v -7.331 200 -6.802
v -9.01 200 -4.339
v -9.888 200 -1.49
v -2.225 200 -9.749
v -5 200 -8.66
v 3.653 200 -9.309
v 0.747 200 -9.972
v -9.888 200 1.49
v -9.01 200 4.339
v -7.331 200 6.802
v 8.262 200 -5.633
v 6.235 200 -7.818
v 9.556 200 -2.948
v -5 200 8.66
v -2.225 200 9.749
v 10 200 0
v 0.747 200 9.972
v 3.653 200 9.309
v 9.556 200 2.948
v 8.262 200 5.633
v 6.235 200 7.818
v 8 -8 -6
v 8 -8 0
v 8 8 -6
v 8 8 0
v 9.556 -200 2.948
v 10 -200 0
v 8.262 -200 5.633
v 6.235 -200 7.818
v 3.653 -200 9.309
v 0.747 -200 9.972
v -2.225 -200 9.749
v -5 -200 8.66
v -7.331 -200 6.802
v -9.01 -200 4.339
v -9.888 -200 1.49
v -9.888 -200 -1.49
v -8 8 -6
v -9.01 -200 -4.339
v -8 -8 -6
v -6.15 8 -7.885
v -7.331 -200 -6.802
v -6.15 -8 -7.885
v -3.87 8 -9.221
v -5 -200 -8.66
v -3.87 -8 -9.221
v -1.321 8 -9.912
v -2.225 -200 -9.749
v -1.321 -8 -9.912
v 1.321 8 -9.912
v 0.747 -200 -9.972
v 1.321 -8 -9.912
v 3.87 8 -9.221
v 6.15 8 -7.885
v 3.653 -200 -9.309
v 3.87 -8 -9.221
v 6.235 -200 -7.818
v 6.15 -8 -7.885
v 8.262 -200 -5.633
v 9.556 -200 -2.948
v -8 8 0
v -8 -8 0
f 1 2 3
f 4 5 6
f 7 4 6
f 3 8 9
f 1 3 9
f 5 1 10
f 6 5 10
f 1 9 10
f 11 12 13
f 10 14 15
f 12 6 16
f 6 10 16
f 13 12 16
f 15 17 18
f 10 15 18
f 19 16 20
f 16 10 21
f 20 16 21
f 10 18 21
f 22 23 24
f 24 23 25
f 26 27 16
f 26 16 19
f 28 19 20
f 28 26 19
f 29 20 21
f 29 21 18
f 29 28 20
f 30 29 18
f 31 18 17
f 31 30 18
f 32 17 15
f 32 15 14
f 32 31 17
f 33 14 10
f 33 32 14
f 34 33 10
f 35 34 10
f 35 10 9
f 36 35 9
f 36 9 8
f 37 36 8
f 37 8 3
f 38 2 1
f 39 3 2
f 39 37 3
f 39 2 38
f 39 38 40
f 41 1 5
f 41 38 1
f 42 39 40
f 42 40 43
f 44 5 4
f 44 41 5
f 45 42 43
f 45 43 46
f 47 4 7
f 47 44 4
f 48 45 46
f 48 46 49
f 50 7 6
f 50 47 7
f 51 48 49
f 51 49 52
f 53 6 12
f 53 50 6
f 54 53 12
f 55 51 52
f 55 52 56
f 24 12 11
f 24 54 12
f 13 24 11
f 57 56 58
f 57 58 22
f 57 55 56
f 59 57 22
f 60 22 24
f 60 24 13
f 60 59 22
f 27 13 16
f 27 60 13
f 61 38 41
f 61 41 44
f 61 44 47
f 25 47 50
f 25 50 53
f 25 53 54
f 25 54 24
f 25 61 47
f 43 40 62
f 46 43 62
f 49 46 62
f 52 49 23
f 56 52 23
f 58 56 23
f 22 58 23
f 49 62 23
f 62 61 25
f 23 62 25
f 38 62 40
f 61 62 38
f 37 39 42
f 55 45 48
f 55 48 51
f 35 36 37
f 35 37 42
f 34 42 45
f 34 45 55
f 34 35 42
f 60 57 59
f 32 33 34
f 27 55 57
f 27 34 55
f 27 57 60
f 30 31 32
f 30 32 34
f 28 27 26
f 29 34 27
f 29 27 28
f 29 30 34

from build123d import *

# Parameters (mm, degrees)
F0_R          = 10
F1_DEPTH      = 200
F1_DEPTH_BACK = 200
F2_W          = 16
F2_H          = 16
F3_DEPTH      = 25


with BuildPart() as f1:
    # F0 (on Front) → F1 (new body, two sides)
    with BuildSketch(Plane.XZ) as f1_sk:
        Circle(F0_R)
    extrude(amount=F1_DEPTH)
    extrude(f1_sk.sketch, amount=-F1_DEPTH_BACK)

    # F2 (on Top) → F3 (cut)
    with BuildSketch(Plane.XY):
        Rectangle(F2_W, F2_H)
    extrude(amount=-F3_DEPTH, mode=Mode.SUBTRACT)


solid = f1.part
